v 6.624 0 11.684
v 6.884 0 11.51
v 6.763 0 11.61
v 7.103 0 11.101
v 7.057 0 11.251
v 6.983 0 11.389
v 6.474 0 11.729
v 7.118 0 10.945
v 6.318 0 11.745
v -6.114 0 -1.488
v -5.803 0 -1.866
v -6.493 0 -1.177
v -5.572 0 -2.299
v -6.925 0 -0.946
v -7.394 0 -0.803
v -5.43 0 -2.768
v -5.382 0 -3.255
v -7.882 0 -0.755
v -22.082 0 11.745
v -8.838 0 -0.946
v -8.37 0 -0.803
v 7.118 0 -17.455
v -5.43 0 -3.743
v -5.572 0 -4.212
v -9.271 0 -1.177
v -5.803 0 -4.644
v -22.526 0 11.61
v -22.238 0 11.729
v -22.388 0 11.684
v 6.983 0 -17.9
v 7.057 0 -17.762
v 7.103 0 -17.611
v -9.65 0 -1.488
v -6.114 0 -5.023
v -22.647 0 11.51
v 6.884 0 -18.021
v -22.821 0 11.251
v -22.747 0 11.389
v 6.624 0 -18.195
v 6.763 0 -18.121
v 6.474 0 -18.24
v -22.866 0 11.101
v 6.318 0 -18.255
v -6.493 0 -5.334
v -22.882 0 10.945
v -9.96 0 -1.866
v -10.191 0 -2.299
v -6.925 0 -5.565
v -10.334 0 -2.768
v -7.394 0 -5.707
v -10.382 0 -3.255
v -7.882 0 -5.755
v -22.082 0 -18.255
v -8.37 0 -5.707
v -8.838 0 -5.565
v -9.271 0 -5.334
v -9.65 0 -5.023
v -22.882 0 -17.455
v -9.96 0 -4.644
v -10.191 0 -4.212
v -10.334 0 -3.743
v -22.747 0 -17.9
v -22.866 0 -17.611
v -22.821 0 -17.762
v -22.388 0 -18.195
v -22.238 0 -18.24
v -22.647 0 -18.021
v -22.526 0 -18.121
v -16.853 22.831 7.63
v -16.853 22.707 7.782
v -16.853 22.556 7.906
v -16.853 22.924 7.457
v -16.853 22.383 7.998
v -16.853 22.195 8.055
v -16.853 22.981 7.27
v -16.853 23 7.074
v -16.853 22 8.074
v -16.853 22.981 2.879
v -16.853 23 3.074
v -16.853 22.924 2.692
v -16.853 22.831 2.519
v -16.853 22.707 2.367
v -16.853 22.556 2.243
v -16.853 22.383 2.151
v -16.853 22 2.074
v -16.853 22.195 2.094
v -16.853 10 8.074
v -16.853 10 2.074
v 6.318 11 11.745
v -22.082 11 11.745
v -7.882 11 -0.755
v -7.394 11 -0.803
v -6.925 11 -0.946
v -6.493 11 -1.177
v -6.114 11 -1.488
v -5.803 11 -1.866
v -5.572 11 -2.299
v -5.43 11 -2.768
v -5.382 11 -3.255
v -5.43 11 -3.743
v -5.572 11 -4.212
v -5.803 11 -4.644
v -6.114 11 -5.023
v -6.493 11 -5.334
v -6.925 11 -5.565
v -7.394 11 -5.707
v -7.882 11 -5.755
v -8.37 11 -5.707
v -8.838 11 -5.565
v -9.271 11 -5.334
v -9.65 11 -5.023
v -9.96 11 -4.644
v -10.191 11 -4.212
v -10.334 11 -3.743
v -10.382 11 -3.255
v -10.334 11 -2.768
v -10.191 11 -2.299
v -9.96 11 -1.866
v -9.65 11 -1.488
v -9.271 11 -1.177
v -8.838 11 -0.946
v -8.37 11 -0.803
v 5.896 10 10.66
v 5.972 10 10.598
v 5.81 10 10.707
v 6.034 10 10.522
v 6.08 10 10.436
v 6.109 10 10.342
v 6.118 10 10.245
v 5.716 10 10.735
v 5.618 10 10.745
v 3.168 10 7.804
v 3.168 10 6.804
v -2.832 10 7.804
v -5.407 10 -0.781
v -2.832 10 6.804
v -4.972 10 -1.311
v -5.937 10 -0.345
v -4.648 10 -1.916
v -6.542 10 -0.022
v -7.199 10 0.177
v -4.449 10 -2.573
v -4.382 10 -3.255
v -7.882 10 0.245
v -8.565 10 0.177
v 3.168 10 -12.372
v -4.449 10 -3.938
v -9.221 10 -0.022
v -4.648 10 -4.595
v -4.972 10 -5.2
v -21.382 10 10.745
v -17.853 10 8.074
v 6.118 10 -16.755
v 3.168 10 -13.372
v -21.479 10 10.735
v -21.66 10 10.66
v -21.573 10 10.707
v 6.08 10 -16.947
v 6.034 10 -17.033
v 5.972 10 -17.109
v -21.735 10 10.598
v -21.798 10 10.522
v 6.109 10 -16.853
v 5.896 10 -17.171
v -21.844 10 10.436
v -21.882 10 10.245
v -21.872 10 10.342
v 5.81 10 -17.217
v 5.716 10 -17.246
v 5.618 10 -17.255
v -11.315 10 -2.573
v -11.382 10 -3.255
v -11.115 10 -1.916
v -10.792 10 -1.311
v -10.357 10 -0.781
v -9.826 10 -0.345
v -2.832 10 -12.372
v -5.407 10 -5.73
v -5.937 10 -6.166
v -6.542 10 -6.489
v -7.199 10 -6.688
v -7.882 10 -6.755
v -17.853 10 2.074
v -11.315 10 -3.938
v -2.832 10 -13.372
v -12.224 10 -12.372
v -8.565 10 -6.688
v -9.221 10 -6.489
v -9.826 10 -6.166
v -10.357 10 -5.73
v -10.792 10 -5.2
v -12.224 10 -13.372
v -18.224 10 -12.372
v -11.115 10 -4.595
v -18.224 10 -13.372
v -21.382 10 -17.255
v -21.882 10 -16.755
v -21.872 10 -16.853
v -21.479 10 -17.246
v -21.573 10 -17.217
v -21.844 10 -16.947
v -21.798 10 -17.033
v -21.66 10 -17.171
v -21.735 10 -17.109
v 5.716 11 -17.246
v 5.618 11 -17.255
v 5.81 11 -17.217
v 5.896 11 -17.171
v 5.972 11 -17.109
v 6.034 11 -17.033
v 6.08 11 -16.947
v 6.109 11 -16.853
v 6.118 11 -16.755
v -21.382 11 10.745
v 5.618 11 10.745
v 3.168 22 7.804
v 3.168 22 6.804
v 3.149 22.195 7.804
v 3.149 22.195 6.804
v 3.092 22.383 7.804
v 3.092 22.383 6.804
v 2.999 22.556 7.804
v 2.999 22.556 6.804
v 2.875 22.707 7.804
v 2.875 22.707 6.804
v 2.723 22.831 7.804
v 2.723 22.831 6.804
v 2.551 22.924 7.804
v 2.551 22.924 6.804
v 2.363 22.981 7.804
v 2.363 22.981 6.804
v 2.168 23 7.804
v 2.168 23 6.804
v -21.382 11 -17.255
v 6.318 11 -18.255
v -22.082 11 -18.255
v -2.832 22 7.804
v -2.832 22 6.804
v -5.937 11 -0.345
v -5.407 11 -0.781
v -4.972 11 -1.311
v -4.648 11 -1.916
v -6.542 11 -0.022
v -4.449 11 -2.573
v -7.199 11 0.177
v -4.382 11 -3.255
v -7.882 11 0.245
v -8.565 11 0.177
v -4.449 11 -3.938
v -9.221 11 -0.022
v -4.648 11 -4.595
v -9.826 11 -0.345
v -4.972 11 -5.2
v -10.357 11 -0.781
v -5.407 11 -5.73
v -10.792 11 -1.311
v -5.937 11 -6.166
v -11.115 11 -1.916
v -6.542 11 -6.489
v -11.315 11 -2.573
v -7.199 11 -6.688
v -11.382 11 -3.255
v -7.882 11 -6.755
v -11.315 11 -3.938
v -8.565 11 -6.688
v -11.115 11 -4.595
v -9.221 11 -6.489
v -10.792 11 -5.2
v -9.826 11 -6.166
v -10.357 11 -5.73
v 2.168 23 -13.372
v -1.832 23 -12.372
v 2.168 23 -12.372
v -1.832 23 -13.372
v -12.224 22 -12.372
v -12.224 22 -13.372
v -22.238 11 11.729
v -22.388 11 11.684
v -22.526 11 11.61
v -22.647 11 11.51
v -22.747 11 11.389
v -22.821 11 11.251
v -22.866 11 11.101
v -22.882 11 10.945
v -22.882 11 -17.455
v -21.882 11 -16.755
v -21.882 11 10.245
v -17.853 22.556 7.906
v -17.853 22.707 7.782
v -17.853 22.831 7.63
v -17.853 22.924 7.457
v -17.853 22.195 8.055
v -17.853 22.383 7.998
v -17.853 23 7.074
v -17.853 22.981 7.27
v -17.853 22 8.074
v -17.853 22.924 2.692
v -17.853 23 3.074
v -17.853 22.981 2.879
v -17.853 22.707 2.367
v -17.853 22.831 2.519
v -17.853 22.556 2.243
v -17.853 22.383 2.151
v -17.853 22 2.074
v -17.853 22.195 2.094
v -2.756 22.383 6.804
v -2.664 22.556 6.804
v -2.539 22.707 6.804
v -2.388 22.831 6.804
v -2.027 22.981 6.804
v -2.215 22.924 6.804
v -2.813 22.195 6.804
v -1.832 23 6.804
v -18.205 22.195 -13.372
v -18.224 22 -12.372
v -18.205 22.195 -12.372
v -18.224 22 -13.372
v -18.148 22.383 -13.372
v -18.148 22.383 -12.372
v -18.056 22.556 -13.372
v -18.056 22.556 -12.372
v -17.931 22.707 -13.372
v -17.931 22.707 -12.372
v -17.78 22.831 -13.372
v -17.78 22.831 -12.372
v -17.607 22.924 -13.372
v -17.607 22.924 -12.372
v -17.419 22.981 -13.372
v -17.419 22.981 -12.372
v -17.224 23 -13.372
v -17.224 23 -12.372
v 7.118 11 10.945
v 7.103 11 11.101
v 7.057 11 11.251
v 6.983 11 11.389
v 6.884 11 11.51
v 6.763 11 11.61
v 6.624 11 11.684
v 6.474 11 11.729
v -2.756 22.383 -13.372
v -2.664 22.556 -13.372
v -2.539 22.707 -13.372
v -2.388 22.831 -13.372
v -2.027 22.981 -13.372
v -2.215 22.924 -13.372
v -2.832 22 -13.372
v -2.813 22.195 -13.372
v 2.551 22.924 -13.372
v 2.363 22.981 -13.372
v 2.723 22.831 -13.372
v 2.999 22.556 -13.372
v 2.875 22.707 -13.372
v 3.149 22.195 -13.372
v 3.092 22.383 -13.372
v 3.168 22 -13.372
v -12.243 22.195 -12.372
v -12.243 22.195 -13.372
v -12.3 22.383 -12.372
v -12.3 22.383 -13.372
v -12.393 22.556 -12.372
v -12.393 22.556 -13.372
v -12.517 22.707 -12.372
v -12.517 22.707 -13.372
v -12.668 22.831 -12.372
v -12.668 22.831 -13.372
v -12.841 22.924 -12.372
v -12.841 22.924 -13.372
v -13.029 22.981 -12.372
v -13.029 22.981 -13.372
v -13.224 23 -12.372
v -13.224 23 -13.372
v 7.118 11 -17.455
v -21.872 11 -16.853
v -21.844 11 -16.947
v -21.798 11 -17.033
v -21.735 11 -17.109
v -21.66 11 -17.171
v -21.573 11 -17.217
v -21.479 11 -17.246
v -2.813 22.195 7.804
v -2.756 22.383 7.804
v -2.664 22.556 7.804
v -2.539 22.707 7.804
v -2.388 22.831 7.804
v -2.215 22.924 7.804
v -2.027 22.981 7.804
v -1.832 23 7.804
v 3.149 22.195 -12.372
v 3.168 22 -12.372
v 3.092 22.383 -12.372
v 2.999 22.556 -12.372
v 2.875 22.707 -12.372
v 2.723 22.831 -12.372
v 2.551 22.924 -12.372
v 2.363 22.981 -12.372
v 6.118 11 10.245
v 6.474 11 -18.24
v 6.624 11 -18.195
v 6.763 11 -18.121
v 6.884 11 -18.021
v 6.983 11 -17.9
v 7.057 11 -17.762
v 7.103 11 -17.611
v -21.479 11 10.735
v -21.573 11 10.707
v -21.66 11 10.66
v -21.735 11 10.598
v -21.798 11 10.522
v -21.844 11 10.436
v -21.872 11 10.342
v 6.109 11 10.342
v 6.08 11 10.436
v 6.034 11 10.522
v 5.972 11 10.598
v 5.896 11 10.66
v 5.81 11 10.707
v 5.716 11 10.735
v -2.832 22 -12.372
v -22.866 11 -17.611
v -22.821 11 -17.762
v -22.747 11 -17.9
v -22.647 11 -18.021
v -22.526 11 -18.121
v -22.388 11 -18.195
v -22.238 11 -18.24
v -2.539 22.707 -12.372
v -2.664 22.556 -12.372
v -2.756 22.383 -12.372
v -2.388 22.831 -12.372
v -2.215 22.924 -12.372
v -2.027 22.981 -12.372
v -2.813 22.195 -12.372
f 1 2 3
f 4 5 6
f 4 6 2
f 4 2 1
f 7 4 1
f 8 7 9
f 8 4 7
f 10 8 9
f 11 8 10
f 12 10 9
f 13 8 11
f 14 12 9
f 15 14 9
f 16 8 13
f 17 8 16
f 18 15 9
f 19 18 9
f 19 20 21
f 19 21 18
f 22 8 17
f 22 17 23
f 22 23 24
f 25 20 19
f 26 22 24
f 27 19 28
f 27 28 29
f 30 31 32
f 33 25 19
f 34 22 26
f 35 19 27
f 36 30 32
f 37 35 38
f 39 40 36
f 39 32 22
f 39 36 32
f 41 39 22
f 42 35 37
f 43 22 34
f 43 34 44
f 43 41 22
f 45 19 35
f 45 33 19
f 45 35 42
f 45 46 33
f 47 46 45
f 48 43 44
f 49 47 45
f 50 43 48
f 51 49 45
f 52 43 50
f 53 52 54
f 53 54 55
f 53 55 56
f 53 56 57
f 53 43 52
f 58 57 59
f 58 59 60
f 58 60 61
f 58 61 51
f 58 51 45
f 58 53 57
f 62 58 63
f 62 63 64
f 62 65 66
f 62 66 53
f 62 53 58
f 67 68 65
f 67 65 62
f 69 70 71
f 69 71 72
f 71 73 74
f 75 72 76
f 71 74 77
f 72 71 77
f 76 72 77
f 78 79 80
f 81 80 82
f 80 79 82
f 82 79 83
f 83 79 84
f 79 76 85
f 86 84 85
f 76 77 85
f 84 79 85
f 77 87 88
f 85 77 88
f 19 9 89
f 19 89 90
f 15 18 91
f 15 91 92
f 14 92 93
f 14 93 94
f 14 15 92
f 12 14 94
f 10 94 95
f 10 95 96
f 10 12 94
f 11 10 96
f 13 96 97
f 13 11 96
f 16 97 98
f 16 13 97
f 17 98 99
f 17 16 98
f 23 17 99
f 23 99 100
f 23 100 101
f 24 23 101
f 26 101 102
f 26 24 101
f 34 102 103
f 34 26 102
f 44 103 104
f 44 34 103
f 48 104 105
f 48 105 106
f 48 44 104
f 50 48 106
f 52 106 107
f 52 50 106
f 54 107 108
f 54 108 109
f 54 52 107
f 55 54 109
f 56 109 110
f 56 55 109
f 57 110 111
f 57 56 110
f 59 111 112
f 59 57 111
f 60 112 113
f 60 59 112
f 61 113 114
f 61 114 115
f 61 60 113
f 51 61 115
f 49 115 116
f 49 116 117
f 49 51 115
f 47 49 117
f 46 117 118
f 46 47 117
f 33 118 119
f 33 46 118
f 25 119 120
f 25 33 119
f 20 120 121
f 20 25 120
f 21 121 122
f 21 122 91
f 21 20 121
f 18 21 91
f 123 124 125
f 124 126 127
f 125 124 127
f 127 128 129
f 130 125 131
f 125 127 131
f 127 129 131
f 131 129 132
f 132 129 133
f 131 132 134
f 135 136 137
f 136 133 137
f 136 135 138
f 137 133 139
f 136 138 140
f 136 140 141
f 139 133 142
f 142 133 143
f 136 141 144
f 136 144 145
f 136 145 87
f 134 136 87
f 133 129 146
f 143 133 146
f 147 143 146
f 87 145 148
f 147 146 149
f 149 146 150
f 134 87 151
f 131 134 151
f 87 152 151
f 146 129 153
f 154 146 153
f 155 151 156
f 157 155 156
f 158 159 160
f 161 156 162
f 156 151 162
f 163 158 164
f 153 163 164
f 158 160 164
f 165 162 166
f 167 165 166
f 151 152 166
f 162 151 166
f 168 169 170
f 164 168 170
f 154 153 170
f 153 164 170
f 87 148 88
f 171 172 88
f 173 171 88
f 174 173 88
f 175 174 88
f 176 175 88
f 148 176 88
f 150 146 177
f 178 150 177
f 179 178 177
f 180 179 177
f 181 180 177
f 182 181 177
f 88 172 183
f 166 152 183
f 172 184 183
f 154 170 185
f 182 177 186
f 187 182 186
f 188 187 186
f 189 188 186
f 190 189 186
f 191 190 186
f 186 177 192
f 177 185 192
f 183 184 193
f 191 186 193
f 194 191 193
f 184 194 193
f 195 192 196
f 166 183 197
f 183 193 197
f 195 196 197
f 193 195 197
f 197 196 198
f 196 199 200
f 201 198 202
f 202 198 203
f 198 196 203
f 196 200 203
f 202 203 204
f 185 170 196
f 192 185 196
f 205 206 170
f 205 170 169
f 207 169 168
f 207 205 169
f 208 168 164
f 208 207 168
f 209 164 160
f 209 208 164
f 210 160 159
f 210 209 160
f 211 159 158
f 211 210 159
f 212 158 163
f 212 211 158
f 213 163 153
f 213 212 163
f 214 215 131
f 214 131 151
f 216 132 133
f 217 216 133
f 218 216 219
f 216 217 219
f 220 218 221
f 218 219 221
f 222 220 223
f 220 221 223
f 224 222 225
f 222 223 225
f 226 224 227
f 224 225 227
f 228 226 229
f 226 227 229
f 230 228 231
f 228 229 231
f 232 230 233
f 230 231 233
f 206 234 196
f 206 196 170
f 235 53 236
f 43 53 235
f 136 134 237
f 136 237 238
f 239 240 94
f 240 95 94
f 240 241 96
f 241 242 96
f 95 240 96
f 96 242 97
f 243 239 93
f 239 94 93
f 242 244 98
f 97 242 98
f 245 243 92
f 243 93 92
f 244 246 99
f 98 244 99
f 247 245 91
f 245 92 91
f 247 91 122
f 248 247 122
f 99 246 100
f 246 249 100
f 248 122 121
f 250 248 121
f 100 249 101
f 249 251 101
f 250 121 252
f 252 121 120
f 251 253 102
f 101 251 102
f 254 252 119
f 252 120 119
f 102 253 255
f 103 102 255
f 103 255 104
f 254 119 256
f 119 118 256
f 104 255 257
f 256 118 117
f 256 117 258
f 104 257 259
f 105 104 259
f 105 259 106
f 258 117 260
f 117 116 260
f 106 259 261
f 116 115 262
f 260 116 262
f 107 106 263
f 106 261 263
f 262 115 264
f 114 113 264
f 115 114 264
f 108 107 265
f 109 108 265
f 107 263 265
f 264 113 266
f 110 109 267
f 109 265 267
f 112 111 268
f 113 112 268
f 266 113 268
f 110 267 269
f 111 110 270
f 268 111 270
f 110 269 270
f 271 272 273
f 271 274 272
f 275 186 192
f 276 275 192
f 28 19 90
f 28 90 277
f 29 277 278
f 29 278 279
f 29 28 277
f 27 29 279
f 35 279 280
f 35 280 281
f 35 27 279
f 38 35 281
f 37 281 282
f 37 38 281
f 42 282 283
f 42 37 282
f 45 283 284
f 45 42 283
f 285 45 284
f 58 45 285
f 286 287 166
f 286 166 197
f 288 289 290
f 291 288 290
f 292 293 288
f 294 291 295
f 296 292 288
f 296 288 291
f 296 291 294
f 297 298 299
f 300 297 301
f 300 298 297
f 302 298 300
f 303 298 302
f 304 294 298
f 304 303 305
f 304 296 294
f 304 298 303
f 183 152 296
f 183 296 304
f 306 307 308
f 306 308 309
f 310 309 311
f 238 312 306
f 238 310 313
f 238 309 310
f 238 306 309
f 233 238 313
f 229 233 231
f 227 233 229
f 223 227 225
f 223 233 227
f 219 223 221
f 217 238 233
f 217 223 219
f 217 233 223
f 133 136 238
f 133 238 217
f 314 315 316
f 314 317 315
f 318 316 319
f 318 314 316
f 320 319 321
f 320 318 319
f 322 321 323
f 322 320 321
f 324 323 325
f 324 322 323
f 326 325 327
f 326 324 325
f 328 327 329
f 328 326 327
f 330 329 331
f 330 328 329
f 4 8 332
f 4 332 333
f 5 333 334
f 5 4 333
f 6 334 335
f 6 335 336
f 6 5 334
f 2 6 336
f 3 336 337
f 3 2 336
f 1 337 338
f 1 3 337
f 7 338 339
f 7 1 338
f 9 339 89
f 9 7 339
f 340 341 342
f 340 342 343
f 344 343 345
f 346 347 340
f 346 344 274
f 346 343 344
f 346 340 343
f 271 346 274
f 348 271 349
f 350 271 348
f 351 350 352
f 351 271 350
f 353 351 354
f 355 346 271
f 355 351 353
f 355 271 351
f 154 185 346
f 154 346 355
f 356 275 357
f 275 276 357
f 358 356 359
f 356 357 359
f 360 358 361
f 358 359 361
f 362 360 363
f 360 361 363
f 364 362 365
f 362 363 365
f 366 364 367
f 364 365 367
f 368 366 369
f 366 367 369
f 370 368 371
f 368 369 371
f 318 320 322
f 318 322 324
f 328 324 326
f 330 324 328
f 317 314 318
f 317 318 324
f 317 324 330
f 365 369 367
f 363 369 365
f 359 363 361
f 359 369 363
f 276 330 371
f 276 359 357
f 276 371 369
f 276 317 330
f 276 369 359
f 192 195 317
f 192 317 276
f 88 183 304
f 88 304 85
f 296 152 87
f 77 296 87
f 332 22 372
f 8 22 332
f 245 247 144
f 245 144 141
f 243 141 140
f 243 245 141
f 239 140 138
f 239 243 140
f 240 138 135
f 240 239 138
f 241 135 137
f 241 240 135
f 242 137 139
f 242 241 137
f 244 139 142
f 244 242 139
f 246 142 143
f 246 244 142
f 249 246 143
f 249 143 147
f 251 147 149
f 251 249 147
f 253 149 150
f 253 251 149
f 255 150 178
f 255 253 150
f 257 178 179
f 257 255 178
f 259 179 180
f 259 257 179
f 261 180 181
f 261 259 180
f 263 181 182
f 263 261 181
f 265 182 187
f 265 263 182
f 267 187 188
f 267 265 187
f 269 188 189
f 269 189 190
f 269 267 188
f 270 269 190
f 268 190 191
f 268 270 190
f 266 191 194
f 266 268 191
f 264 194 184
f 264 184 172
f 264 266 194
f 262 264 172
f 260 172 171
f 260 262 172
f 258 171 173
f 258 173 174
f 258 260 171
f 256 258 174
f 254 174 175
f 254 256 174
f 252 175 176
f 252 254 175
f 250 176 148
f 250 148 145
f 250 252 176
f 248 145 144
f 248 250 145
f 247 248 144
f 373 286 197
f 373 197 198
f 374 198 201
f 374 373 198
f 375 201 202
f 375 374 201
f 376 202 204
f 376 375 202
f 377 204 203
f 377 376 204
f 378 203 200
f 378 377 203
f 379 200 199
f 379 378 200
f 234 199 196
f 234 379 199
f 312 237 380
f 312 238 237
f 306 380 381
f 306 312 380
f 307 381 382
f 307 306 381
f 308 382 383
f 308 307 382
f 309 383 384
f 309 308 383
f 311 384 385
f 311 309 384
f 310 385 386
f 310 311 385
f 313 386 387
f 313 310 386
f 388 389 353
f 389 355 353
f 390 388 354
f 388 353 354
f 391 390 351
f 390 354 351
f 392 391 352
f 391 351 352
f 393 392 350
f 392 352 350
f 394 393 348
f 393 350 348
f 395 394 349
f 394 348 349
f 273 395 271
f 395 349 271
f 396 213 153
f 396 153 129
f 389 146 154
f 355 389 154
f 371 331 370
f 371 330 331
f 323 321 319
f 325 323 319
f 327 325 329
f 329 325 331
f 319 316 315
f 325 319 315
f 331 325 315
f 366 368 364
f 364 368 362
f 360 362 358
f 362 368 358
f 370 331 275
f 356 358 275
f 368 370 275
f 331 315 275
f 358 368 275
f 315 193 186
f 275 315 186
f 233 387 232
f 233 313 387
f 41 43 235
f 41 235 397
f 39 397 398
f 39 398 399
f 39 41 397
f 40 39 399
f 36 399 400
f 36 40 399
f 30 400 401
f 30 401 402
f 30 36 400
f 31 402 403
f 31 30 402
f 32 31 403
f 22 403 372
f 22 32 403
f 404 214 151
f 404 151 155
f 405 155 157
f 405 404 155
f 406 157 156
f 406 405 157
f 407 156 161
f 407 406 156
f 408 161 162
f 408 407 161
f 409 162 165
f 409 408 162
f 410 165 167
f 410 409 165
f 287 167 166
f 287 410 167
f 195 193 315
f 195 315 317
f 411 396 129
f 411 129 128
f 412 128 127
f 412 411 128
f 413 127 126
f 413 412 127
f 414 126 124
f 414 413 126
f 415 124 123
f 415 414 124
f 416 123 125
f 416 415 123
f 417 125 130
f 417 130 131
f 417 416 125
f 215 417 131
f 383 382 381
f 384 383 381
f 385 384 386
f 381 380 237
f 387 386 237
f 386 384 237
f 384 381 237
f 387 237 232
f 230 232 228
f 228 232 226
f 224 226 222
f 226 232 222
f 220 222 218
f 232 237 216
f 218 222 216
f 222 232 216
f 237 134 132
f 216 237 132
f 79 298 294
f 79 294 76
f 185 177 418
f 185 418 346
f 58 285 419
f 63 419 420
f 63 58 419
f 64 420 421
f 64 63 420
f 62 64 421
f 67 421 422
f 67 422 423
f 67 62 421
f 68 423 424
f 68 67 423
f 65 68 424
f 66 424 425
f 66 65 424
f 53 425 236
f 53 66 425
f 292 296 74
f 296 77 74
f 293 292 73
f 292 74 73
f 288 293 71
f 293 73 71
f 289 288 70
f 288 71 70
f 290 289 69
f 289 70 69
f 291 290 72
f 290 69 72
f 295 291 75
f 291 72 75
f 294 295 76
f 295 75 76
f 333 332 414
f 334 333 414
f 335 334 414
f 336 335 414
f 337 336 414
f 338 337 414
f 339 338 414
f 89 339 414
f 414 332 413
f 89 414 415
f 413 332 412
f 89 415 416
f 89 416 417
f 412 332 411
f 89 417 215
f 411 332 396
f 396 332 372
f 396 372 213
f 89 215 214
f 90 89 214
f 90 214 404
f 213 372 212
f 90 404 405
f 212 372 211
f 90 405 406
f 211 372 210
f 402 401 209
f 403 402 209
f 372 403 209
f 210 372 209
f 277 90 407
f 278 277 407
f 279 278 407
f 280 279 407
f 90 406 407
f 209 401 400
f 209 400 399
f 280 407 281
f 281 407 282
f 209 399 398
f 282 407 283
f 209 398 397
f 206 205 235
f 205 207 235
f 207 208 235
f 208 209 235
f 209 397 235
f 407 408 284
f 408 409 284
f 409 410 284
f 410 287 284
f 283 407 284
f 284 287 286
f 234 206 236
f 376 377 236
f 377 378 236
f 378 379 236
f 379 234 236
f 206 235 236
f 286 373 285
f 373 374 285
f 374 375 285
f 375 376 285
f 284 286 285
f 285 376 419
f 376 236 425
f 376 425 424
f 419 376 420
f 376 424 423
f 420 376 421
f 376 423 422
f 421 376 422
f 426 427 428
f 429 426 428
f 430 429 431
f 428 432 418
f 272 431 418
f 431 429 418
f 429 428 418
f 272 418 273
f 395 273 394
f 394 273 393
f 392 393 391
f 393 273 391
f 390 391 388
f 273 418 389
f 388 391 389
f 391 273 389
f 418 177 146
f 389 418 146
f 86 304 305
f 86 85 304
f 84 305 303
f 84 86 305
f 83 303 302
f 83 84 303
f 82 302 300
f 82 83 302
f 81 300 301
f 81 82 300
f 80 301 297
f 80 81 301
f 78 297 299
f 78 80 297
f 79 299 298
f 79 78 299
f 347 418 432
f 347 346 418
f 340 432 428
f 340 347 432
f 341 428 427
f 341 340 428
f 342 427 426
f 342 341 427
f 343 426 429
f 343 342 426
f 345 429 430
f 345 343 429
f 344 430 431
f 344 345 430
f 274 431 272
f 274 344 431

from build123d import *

# Parameters (mm, degrees)
SKETCH1_R           = 2.5
BOSS_EXTRUDE1_DEPTH = 11
SKETCH2_R           = 3.5
CUT_EXTRUDE1_DEPTH  = 1
SKETCH3_W           = 6
SKETCH3_H           = 1
SKETCH3_W_2         = 1
SKETCH3_H_2         = 6
BOSS_EXTRUDE2_DEPTH = 13
FILLET1_R           = 1


with BuildPart() as part:
    # Sketch1 → Boss-Extrude1 (new body)
    with BuildSketch(Plane(origin=(0, 0, 0), x_dir=(1, 0, 0), z_dir=(0, 1, 0))):
        with BuildLine():
            Line((-22.081775976, 18.25540597), (6.318224024, 18.25540597))
            ThreePointArc((6.318224024, 18.25540597), (6.883909449, 18.021091395), (7.118224024, 17.45540597))
            Line((7.118224024, 17.45540597), (7.118224024, -10.94459403))
            ThreePointArc((7.118224024, -10.94459403), (6.883909449, -11.510279455), (6.318224024, -11.74459403))
            Line((6.318224024, -11.74459403), (-22.081775976, -11.74459403))
            ThreePointArc((-22.081775976, -11.74459403), (-22.647461401, -11.510279455), (-22.881775976, -10.94459403))
            Line((-22.881775976, -10.94459403), (-22.881775976, 17.45540597))
            ThreePointArc((-22.881775976, 17.45540597), (-22.647461401, 18.021091395), (-22.081775976, 18.25540597))
        make_face()
        with Locations(Location((-7.881775976, 3.25540597, 0), (0, 0, 270))):
            Circle(SKETCH1_R, mode=Mode.SUBTRACT)
    extrude(amount=BOSS_EXTRUDE1_DEPTH)

    # Sketch2 → Cut-Extrude1 (cut)
    with BuildSketch(Plane(origin=(0, 11, 0), x_dir=(1, 0, 0), z_dir=(0, 1, 0))):
        with BuildLine():
            Line((-21.381775976, 17.25540597), (5.618224024, 17.25540597))
            ThreePointArc((5.618224024, 17.25540597), (5.971777415, 17.108959361), (6.118224024, 16.75540597))
            Line((6.118224024, 16.75540597), (6.118224024, -10.24459403))
            ThreePointArc((6.118224024, -10.24459403), (5.971777415, -10.598147421), (5.618224024, -10.74459403))
            Line((5.618224024, -10.74459403), (-21.381775976, -10.74459403))
            ThreePointArc((-21.381775976, -10.74459403), (-21.735329367, -10.598147421), (-21.881775976, -10.24459403))
            Line((-21.881775976, -10.24459403), (-21.881775976, 16.75540597))
            ThreePointArc((-21.881775976, 16.75540597), (-21.735329367, 17.108959361), (-21.381775976, 17.25540597))
        make_face()
        with Locations(Location((-7.881775976, 3.25540597, 0), (0, 0, 270))):
            Circle(SKETCH2_R, mode=Mode.SUBTRACT)
    extrude(amount=-CUT_EXTRUDE1_DEPTH, mode=Mode.SUBTRACT)

    # Sketch3 → Boss-Extrude2 (add)
    with BuildSketch(Plane(origin=(0, 10, 0), x_dir=(1, 0, 0), z_dir=(0, 1, 0))):
        with Locations((-15.224035156, 12.872185426)):
            Rectangle(SKETCH3_W, SKETCH3_H)
        with Locations((0.167819541, 12.872185426)):
            Rectangle(SKETCH3_W, SKETCH3_H)
        with Locations((0.167819541, -7.304488602)):
            Rectangle(SKETCH3_W, SKETCH3_H)
        with Locations((-17.353346933, -5.074456638)):
            Rectangle(SKETCH3_W_2, SKETCH3_H_2)
    extrude(amount=BOSS_EXTRUDE2_DEPTH)

    # Fillet1
    fillet1_edges = [part.edges().sort_by_distance(p)[0] for p in [
        (-18.224035156, 23, -12.872185426),
        (-12.224035156, 23, -12.872185426),
        (-2.832180459, 23, -12.872185426),
        (3.167819541, 23, -12.872185426),
        (-2.832180459, 23, 7.304488602),
        (3.167819541, 23, 7.304488602),
        (-17.353346933, 23, 8.074456638),
        (-17.353346933, 23, 2.074456638),
    ]]
    fillet(fillet1_edges, radius=FILLET1_R)


solid = part.part
